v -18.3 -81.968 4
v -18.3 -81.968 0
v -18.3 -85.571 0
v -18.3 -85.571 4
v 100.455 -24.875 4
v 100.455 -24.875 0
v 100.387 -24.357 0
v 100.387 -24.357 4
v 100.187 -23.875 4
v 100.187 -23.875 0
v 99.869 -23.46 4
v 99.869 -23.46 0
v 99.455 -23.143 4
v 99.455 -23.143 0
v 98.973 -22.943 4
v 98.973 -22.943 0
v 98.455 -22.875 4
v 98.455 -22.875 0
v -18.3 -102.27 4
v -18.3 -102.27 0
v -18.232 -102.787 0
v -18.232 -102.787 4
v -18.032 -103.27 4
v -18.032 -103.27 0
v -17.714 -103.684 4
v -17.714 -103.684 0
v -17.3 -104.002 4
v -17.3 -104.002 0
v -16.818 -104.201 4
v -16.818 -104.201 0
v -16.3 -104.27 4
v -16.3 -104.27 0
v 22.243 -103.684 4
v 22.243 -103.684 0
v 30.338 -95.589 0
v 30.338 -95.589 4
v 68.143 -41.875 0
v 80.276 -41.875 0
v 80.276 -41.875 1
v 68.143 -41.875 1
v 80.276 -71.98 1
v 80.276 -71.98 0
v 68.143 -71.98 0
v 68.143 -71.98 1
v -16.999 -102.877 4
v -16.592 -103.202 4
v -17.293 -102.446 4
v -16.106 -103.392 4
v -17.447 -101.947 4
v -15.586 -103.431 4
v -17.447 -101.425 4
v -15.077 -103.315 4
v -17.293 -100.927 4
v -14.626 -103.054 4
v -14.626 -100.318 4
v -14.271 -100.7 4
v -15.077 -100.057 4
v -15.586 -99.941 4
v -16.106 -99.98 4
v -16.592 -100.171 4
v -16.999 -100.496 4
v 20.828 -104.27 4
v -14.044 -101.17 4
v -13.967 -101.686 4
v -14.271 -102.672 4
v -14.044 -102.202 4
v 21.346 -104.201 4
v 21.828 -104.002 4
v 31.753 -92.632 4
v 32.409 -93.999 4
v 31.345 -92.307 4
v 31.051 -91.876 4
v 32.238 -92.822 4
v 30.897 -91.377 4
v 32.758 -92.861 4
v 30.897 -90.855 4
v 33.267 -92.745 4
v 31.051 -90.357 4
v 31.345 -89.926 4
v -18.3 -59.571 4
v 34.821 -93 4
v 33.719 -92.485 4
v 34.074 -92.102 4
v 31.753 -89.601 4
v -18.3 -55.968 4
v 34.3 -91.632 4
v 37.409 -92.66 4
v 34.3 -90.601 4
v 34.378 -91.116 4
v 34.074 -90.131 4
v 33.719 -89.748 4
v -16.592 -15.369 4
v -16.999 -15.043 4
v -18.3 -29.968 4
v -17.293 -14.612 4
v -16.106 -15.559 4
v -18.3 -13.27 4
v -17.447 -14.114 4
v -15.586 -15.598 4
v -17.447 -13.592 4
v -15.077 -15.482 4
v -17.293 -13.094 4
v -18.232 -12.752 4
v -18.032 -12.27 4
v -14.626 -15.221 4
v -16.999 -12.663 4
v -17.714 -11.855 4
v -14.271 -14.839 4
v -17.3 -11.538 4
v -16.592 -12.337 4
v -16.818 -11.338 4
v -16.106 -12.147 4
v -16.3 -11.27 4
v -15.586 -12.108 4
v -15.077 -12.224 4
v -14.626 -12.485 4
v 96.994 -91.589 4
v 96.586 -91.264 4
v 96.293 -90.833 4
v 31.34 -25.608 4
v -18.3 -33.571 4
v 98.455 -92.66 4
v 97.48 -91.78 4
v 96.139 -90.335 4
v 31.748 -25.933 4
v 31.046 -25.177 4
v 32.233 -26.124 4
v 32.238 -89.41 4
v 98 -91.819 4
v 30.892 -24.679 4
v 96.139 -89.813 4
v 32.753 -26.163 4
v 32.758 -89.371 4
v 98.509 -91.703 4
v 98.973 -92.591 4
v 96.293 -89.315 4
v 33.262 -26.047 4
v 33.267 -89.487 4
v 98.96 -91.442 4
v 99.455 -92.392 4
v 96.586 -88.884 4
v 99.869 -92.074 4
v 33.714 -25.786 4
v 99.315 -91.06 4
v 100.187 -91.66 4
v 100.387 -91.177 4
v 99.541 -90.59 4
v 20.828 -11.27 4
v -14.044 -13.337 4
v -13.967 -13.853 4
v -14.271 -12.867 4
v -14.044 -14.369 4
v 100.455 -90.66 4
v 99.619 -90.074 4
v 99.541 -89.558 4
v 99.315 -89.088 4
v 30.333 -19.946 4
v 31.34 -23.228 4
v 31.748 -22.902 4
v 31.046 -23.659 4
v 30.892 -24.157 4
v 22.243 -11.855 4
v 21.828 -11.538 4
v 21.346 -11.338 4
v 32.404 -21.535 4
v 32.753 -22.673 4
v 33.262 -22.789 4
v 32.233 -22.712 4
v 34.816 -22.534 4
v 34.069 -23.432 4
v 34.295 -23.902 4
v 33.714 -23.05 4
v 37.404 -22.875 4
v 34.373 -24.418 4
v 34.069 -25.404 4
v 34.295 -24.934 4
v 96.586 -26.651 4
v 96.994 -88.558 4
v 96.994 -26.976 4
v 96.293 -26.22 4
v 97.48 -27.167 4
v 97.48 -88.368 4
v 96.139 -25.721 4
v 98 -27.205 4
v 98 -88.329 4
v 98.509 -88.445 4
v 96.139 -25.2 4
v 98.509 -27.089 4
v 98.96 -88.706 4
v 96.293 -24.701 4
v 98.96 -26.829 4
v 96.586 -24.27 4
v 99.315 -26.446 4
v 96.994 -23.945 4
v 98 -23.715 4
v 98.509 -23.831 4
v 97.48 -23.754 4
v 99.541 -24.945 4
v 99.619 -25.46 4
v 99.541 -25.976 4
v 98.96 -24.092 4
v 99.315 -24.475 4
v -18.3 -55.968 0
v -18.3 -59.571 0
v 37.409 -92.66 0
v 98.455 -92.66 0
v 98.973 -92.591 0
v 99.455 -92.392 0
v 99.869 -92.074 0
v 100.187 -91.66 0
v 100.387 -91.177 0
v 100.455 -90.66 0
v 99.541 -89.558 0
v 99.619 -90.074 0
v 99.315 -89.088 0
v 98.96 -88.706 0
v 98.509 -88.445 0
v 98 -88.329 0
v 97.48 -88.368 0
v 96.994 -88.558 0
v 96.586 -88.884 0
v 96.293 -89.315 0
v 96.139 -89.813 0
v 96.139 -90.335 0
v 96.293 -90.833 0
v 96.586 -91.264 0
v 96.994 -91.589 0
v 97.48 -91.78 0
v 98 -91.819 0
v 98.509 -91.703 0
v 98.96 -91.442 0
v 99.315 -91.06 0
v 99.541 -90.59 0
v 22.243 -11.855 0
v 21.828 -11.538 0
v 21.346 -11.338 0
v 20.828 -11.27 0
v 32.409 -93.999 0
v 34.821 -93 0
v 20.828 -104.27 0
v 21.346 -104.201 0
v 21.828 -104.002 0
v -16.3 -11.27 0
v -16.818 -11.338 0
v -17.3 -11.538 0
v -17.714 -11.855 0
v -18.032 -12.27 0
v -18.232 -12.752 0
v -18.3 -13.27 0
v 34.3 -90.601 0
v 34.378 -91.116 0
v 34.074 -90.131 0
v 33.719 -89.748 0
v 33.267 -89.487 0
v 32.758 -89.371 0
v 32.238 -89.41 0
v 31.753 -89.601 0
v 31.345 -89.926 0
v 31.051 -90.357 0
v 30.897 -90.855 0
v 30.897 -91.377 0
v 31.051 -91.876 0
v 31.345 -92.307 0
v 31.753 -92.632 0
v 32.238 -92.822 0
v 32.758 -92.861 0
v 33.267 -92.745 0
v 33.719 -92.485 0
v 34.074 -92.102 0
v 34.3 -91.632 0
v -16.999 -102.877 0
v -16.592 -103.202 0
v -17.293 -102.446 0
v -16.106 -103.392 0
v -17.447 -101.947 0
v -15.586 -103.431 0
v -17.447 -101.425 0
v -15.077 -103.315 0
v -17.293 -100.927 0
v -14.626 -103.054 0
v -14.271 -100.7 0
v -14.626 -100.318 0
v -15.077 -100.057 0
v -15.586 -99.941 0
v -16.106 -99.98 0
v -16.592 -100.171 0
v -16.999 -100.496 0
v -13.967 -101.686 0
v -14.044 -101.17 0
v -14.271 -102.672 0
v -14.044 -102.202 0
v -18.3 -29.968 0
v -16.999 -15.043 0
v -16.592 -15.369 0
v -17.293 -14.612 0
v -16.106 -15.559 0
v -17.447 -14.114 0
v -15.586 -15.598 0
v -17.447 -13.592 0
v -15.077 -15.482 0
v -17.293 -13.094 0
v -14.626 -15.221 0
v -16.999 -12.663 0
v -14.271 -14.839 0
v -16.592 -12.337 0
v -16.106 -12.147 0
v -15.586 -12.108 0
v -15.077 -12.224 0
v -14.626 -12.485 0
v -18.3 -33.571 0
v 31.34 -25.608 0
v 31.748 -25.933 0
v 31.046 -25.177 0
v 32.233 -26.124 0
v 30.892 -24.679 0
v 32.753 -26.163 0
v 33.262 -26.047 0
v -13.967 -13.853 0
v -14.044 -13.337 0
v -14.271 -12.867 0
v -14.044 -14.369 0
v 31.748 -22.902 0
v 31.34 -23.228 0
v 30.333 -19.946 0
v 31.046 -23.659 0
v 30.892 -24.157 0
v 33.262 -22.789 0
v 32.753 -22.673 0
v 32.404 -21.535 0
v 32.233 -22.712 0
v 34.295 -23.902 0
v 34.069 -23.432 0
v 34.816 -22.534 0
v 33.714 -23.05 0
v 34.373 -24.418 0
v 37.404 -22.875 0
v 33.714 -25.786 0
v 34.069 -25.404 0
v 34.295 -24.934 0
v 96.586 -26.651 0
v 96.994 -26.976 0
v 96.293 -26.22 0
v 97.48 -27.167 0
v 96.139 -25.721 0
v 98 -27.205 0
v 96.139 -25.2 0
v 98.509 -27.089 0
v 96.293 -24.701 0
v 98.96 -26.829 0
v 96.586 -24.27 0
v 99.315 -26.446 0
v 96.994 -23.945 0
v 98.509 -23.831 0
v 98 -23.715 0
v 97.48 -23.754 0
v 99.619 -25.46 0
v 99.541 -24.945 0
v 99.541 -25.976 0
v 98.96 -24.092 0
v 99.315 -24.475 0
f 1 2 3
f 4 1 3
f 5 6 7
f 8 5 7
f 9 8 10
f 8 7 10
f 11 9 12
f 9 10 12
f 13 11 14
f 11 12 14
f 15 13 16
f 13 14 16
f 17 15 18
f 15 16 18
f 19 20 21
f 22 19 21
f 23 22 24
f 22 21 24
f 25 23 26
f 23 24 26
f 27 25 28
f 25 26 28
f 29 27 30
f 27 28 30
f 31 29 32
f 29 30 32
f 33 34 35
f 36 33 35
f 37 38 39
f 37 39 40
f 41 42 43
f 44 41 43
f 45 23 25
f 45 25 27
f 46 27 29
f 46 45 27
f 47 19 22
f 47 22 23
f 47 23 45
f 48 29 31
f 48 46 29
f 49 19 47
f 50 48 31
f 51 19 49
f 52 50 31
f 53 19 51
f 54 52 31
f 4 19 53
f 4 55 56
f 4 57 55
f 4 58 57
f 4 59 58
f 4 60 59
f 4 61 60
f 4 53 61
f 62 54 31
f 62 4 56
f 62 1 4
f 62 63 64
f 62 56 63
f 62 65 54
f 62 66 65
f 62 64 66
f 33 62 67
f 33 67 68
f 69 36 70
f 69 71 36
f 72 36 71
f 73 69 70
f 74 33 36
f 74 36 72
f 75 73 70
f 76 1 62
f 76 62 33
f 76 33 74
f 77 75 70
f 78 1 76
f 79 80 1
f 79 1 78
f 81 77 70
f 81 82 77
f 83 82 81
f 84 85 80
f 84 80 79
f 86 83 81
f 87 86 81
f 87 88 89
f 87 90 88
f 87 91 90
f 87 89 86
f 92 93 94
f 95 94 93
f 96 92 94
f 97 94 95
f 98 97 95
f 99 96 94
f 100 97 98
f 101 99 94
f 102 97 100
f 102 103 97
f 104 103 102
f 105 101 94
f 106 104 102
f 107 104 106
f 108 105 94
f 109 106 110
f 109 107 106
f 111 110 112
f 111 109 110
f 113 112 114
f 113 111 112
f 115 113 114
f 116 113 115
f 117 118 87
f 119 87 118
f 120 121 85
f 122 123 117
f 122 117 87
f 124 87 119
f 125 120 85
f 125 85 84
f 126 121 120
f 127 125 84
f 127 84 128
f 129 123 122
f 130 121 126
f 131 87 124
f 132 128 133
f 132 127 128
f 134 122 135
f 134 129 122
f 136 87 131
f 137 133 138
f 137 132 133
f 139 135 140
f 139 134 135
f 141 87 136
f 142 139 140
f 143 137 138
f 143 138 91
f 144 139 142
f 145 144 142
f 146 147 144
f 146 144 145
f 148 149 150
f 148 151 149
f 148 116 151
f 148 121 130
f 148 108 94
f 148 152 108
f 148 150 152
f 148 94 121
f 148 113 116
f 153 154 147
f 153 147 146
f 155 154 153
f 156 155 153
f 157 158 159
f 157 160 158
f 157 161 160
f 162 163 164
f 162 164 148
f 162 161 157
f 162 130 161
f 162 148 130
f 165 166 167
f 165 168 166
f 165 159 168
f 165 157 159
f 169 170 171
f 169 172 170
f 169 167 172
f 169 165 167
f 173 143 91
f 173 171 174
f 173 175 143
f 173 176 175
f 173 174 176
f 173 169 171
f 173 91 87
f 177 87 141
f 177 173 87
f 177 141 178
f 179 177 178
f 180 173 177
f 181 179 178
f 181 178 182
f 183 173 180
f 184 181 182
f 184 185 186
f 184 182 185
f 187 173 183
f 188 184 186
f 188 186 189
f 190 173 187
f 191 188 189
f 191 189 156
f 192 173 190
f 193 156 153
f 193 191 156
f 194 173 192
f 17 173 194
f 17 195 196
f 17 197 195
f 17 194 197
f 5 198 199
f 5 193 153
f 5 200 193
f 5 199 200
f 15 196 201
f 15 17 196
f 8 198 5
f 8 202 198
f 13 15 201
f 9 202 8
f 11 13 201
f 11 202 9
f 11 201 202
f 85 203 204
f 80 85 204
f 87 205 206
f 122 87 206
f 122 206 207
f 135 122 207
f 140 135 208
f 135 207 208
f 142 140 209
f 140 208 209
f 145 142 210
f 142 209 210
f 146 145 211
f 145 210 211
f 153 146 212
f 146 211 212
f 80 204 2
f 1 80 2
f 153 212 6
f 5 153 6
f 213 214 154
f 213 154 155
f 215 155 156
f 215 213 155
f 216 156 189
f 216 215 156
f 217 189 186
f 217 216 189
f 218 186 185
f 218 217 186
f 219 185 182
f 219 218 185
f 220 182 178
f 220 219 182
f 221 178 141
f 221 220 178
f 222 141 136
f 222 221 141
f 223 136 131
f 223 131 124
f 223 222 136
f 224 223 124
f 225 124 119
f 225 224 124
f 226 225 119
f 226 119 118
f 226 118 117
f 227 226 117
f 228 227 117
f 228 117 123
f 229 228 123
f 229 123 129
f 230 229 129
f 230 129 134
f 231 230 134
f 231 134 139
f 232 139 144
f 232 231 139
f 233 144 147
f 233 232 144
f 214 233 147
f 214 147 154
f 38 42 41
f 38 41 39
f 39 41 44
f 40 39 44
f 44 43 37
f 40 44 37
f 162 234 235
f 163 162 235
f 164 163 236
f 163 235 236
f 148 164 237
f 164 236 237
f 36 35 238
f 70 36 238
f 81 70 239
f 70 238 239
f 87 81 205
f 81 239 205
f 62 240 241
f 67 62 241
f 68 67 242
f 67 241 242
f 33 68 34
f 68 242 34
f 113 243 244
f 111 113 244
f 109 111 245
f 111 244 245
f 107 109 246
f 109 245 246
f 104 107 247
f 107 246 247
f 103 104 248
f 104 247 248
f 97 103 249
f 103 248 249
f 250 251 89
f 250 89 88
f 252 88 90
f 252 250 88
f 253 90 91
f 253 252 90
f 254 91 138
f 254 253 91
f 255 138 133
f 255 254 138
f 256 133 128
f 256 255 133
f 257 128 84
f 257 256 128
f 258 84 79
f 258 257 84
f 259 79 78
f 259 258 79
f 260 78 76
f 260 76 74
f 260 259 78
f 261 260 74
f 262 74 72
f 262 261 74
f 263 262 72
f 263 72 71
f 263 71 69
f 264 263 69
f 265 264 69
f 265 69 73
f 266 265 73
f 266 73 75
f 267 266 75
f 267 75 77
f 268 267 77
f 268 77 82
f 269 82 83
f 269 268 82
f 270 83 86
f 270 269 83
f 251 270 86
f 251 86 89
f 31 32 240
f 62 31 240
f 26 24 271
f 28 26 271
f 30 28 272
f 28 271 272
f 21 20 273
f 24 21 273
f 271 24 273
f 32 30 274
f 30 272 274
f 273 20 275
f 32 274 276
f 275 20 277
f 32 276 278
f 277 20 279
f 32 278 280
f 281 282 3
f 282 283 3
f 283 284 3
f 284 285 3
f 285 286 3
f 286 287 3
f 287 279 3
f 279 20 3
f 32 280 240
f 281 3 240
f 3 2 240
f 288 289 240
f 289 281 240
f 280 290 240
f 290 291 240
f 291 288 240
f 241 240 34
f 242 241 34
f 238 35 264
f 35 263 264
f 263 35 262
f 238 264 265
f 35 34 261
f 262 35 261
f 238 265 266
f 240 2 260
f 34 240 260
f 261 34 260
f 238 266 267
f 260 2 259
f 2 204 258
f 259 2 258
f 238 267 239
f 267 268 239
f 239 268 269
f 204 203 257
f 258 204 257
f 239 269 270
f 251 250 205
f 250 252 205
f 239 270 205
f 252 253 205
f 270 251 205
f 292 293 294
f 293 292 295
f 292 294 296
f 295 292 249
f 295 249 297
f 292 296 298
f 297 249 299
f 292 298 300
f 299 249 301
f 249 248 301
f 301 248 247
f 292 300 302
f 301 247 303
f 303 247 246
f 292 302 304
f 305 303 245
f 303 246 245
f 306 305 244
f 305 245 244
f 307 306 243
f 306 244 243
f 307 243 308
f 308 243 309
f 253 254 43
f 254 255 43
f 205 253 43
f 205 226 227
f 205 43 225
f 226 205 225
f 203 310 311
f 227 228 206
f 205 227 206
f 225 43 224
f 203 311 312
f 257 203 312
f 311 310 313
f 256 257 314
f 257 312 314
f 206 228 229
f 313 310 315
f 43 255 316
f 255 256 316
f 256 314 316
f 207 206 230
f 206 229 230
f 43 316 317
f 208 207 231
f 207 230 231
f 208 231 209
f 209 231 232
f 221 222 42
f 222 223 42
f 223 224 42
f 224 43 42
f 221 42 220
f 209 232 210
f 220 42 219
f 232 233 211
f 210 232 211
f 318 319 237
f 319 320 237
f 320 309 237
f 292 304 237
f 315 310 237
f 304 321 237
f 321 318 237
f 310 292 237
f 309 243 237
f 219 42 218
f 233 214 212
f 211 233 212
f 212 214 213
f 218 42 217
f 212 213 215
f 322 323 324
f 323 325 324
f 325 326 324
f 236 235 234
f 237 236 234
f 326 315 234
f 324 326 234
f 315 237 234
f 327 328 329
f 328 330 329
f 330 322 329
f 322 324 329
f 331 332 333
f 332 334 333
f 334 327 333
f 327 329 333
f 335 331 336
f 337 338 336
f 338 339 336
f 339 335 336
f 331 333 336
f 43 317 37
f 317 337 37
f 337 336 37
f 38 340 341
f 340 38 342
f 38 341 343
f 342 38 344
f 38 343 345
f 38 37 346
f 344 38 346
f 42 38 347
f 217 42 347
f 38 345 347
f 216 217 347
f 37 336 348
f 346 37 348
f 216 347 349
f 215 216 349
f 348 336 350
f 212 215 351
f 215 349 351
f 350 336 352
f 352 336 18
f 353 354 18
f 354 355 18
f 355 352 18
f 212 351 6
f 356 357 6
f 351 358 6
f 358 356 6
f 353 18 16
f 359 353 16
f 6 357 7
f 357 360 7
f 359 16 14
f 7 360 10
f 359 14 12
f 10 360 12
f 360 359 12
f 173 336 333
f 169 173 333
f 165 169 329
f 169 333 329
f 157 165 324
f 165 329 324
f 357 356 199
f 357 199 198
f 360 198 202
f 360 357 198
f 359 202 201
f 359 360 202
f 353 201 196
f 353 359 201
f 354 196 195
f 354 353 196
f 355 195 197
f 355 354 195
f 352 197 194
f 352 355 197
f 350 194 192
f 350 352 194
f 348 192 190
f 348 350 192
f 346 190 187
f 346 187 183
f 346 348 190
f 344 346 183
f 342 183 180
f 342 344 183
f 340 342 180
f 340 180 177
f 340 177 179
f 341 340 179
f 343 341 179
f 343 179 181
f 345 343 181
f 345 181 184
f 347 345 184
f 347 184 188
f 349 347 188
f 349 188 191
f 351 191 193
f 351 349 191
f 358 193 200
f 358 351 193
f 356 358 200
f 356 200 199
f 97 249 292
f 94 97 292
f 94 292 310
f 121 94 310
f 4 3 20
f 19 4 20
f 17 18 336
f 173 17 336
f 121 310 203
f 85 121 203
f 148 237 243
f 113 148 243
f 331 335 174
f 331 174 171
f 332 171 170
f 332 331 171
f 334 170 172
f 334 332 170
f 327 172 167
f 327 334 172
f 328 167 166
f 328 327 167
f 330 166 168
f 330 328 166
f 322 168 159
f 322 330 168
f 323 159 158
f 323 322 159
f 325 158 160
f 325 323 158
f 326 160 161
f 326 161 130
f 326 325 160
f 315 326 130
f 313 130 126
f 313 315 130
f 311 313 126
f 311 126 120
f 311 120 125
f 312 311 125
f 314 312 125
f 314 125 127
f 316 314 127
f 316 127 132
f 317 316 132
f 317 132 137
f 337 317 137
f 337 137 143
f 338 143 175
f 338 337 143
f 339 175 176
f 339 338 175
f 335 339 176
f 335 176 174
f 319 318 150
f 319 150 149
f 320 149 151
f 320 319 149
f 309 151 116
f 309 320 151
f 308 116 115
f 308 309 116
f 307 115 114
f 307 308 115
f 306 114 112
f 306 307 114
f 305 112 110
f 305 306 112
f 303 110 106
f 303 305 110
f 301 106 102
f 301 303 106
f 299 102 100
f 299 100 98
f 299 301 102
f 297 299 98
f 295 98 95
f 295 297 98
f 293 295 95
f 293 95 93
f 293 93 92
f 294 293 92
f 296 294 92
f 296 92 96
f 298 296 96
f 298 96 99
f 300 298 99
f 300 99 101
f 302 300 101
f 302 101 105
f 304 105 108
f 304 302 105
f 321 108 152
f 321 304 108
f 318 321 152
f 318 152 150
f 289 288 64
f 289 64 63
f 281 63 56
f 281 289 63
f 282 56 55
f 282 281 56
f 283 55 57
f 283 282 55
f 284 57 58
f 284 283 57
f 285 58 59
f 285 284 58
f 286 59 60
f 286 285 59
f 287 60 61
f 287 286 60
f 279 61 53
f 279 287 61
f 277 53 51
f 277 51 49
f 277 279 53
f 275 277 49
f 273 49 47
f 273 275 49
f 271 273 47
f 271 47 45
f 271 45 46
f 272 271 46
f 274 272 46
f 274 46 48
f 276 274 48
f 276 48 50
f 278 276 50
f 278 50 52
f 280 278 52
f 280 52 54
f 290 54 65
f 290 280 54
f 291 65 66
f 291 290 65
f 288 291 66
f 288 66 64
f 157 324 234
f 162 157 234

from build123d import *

# Parameters (mm, degrees)
SKETCH1_R           = 1.75
BOSS_EXTRUDE1_DEPTH = 4
SKETCH2_W           = 12.132955251
SKETCH2_H           = 30.105
CUT_EXTRUDE2_DEPTH  = 1


with BuildPart() as part:
    # Sketch1 → Boss-Extrude1 (new body)
    with BuildSketch(Plane.XY):
        with BuildLine():
            Line((22.242640687, -103.68381275), (30.337922061, -95.588531376))
            ThreePointArc((30.337922061, -95.588531376), (33.58215555, -93.420803863), (37.408989873, -92.659599188))
            Line((37.408989873, -92.659599188), (97.386933012, -92.659599188))
            Line((97.386933012, -92.659599188), (98.455, -92.659599188))
            ThreePointArc((98.455, -92.659599188), (99.869213562, -92.07381275), (100.455, -90.659599188))
            Line((100.455, -90.659599188), (100.455, -24.874599188))
            ThreePointArc((100.455, -24.874599188), (99.869213562, -23.460385626), (98.455, -22.874599188))
            Line((98.455, -22.874599188), (97.38733653, -22.874599188))
            Line((97.38733653, -22.874599188), (37.403989873, -22.874599188))
            ThreePointArc((37.403989873, -22.874599188), (33.57715555, -22.113394513), (30.332922061, -19.945667))
            Line((30.332922061, -19.945667), (22.242640687, -11.855385626))
            ThreePointArc((22.242640687, -11.855385626), (21.593793989, -11.421840123), (20.828427125, -11.269599188))
            Line((20.828427125, -11.269599188), (-16.3, -11.269599188))
            ThreePointArc((-16.3, -11.269599188), (-17.714213562, -11.855385626), (-18.3, -13.269599188))
            Line((-18.3, -13.269599188), (-18.3, -29.968425088))
            add(Edge.make_bspline(
                [(-18.3, -29.968425088), (-18.3, -30.568817376), (-18.296844416, -31.1692069), (-18.296844416, -31.769599188), (-18.296844416, -32.369991476), (-18.3, -32.970381), (-18.3, -33.570773288)],
                knots=[0, 0, 0, 0, 0.001801177, 0.001801177, 0.001801177, 0.003602354, 0.003602354, 0.003602354, 0.003602354], degree=3))
            Line((-18.3, -33.570773288), (-18.3, -55.968425088))
            add(Edge.make_bspline(
                [(-18.3, -55.968425088), (-18.3, -56.568817376), (-18.296844416, -57.1692069), (-18.296844416, -57.769599188), (-18.296844416, -58.369991476), (-18.3, -58.970381), (-18.3, -59.570773288)],
                knots=[0, 0, 0, 0, 0.001801177, 0.001801177, 0.001801177, 0.003602354, 0.003602354, 0.003602354, 0.003602354], degree=3))
            Line((-18.3, -59.570773288), (-18.3, -81.968425088))
            add(Edge.make_bspline(
                [(-18.3, -81.968425088), (-18.3, -82.568817376), (-18.296844416, -83.1692069), (-18.296844416, -83.769599188), (-18.296844416, -84.369991476), (-18.3, -84.970381), (-18.3, -85.570773288)],
                knots=[0, 0, 0, 0, 0.001801177, 0.001801177, 0.001801177, 0.003602354, 0.003602354, 0.003602354, 0.003602354], degree=3))
            Line((-18.3, -85.570773288), (-18.3, -102.269599188))
            ThreePointArc((-18.3, -102.269599188), (-17.714213562, -103.68381275), (-16.3, -104.269599188))
            Line((-16.3, -104.269599188), (20.828427125, -104.269599188))
            ThreePointArc((20.828427125, -104.269599188), (21.593793989, -104.117358253), (22.242640687, -103.68381275))
        make_face()
        with Locations((-15.716636906, -101.686236094)):
            Circle(SKETCH1_R, mode=Mode.SUBTRACT)
        with Locations((-15.716636906, -13.852962283)):
            Circle(SKETCH1_R, mode=Mode.SUBTRACT)
        with Locations((32.622607905, -24.417876383)):
            Circle(SKETCH1_R, mode=Mode.SUBTRACT)
        with Locations((32.627607905, -91.116321993)):
            Circle(SKETCH1_R, mode=Mode.SUBTRACT)
        with Locations((97.869213562, -90.07381275)):
            Circle(SKETCH1_R, mode=Mode.SUBTRACT)
        with Locations((97.869213562, -25.460385626)):
            Circle(SKETCH1_R, mode=Mode.SUBTRACT)
    extrude(amount=BOSS_EXTRUDE1_DEPTH)

    # Sketch2 → Cut-Extrude2 (cut)
    with BuildSketch(Plane(origin=(0, 0, 0), x_dir=(-1, 0, 0), z_dir=(0, 0, -1))):
        with Locations((-74.209835266, -56.927099188)):
            Rectangle(SKETCH2_W, SKETCH2_H)
    extrude(amount=-CUT_EXTRUDE2_DEPTH, mode=Mode.SUBTRACT)


solid = part.part
